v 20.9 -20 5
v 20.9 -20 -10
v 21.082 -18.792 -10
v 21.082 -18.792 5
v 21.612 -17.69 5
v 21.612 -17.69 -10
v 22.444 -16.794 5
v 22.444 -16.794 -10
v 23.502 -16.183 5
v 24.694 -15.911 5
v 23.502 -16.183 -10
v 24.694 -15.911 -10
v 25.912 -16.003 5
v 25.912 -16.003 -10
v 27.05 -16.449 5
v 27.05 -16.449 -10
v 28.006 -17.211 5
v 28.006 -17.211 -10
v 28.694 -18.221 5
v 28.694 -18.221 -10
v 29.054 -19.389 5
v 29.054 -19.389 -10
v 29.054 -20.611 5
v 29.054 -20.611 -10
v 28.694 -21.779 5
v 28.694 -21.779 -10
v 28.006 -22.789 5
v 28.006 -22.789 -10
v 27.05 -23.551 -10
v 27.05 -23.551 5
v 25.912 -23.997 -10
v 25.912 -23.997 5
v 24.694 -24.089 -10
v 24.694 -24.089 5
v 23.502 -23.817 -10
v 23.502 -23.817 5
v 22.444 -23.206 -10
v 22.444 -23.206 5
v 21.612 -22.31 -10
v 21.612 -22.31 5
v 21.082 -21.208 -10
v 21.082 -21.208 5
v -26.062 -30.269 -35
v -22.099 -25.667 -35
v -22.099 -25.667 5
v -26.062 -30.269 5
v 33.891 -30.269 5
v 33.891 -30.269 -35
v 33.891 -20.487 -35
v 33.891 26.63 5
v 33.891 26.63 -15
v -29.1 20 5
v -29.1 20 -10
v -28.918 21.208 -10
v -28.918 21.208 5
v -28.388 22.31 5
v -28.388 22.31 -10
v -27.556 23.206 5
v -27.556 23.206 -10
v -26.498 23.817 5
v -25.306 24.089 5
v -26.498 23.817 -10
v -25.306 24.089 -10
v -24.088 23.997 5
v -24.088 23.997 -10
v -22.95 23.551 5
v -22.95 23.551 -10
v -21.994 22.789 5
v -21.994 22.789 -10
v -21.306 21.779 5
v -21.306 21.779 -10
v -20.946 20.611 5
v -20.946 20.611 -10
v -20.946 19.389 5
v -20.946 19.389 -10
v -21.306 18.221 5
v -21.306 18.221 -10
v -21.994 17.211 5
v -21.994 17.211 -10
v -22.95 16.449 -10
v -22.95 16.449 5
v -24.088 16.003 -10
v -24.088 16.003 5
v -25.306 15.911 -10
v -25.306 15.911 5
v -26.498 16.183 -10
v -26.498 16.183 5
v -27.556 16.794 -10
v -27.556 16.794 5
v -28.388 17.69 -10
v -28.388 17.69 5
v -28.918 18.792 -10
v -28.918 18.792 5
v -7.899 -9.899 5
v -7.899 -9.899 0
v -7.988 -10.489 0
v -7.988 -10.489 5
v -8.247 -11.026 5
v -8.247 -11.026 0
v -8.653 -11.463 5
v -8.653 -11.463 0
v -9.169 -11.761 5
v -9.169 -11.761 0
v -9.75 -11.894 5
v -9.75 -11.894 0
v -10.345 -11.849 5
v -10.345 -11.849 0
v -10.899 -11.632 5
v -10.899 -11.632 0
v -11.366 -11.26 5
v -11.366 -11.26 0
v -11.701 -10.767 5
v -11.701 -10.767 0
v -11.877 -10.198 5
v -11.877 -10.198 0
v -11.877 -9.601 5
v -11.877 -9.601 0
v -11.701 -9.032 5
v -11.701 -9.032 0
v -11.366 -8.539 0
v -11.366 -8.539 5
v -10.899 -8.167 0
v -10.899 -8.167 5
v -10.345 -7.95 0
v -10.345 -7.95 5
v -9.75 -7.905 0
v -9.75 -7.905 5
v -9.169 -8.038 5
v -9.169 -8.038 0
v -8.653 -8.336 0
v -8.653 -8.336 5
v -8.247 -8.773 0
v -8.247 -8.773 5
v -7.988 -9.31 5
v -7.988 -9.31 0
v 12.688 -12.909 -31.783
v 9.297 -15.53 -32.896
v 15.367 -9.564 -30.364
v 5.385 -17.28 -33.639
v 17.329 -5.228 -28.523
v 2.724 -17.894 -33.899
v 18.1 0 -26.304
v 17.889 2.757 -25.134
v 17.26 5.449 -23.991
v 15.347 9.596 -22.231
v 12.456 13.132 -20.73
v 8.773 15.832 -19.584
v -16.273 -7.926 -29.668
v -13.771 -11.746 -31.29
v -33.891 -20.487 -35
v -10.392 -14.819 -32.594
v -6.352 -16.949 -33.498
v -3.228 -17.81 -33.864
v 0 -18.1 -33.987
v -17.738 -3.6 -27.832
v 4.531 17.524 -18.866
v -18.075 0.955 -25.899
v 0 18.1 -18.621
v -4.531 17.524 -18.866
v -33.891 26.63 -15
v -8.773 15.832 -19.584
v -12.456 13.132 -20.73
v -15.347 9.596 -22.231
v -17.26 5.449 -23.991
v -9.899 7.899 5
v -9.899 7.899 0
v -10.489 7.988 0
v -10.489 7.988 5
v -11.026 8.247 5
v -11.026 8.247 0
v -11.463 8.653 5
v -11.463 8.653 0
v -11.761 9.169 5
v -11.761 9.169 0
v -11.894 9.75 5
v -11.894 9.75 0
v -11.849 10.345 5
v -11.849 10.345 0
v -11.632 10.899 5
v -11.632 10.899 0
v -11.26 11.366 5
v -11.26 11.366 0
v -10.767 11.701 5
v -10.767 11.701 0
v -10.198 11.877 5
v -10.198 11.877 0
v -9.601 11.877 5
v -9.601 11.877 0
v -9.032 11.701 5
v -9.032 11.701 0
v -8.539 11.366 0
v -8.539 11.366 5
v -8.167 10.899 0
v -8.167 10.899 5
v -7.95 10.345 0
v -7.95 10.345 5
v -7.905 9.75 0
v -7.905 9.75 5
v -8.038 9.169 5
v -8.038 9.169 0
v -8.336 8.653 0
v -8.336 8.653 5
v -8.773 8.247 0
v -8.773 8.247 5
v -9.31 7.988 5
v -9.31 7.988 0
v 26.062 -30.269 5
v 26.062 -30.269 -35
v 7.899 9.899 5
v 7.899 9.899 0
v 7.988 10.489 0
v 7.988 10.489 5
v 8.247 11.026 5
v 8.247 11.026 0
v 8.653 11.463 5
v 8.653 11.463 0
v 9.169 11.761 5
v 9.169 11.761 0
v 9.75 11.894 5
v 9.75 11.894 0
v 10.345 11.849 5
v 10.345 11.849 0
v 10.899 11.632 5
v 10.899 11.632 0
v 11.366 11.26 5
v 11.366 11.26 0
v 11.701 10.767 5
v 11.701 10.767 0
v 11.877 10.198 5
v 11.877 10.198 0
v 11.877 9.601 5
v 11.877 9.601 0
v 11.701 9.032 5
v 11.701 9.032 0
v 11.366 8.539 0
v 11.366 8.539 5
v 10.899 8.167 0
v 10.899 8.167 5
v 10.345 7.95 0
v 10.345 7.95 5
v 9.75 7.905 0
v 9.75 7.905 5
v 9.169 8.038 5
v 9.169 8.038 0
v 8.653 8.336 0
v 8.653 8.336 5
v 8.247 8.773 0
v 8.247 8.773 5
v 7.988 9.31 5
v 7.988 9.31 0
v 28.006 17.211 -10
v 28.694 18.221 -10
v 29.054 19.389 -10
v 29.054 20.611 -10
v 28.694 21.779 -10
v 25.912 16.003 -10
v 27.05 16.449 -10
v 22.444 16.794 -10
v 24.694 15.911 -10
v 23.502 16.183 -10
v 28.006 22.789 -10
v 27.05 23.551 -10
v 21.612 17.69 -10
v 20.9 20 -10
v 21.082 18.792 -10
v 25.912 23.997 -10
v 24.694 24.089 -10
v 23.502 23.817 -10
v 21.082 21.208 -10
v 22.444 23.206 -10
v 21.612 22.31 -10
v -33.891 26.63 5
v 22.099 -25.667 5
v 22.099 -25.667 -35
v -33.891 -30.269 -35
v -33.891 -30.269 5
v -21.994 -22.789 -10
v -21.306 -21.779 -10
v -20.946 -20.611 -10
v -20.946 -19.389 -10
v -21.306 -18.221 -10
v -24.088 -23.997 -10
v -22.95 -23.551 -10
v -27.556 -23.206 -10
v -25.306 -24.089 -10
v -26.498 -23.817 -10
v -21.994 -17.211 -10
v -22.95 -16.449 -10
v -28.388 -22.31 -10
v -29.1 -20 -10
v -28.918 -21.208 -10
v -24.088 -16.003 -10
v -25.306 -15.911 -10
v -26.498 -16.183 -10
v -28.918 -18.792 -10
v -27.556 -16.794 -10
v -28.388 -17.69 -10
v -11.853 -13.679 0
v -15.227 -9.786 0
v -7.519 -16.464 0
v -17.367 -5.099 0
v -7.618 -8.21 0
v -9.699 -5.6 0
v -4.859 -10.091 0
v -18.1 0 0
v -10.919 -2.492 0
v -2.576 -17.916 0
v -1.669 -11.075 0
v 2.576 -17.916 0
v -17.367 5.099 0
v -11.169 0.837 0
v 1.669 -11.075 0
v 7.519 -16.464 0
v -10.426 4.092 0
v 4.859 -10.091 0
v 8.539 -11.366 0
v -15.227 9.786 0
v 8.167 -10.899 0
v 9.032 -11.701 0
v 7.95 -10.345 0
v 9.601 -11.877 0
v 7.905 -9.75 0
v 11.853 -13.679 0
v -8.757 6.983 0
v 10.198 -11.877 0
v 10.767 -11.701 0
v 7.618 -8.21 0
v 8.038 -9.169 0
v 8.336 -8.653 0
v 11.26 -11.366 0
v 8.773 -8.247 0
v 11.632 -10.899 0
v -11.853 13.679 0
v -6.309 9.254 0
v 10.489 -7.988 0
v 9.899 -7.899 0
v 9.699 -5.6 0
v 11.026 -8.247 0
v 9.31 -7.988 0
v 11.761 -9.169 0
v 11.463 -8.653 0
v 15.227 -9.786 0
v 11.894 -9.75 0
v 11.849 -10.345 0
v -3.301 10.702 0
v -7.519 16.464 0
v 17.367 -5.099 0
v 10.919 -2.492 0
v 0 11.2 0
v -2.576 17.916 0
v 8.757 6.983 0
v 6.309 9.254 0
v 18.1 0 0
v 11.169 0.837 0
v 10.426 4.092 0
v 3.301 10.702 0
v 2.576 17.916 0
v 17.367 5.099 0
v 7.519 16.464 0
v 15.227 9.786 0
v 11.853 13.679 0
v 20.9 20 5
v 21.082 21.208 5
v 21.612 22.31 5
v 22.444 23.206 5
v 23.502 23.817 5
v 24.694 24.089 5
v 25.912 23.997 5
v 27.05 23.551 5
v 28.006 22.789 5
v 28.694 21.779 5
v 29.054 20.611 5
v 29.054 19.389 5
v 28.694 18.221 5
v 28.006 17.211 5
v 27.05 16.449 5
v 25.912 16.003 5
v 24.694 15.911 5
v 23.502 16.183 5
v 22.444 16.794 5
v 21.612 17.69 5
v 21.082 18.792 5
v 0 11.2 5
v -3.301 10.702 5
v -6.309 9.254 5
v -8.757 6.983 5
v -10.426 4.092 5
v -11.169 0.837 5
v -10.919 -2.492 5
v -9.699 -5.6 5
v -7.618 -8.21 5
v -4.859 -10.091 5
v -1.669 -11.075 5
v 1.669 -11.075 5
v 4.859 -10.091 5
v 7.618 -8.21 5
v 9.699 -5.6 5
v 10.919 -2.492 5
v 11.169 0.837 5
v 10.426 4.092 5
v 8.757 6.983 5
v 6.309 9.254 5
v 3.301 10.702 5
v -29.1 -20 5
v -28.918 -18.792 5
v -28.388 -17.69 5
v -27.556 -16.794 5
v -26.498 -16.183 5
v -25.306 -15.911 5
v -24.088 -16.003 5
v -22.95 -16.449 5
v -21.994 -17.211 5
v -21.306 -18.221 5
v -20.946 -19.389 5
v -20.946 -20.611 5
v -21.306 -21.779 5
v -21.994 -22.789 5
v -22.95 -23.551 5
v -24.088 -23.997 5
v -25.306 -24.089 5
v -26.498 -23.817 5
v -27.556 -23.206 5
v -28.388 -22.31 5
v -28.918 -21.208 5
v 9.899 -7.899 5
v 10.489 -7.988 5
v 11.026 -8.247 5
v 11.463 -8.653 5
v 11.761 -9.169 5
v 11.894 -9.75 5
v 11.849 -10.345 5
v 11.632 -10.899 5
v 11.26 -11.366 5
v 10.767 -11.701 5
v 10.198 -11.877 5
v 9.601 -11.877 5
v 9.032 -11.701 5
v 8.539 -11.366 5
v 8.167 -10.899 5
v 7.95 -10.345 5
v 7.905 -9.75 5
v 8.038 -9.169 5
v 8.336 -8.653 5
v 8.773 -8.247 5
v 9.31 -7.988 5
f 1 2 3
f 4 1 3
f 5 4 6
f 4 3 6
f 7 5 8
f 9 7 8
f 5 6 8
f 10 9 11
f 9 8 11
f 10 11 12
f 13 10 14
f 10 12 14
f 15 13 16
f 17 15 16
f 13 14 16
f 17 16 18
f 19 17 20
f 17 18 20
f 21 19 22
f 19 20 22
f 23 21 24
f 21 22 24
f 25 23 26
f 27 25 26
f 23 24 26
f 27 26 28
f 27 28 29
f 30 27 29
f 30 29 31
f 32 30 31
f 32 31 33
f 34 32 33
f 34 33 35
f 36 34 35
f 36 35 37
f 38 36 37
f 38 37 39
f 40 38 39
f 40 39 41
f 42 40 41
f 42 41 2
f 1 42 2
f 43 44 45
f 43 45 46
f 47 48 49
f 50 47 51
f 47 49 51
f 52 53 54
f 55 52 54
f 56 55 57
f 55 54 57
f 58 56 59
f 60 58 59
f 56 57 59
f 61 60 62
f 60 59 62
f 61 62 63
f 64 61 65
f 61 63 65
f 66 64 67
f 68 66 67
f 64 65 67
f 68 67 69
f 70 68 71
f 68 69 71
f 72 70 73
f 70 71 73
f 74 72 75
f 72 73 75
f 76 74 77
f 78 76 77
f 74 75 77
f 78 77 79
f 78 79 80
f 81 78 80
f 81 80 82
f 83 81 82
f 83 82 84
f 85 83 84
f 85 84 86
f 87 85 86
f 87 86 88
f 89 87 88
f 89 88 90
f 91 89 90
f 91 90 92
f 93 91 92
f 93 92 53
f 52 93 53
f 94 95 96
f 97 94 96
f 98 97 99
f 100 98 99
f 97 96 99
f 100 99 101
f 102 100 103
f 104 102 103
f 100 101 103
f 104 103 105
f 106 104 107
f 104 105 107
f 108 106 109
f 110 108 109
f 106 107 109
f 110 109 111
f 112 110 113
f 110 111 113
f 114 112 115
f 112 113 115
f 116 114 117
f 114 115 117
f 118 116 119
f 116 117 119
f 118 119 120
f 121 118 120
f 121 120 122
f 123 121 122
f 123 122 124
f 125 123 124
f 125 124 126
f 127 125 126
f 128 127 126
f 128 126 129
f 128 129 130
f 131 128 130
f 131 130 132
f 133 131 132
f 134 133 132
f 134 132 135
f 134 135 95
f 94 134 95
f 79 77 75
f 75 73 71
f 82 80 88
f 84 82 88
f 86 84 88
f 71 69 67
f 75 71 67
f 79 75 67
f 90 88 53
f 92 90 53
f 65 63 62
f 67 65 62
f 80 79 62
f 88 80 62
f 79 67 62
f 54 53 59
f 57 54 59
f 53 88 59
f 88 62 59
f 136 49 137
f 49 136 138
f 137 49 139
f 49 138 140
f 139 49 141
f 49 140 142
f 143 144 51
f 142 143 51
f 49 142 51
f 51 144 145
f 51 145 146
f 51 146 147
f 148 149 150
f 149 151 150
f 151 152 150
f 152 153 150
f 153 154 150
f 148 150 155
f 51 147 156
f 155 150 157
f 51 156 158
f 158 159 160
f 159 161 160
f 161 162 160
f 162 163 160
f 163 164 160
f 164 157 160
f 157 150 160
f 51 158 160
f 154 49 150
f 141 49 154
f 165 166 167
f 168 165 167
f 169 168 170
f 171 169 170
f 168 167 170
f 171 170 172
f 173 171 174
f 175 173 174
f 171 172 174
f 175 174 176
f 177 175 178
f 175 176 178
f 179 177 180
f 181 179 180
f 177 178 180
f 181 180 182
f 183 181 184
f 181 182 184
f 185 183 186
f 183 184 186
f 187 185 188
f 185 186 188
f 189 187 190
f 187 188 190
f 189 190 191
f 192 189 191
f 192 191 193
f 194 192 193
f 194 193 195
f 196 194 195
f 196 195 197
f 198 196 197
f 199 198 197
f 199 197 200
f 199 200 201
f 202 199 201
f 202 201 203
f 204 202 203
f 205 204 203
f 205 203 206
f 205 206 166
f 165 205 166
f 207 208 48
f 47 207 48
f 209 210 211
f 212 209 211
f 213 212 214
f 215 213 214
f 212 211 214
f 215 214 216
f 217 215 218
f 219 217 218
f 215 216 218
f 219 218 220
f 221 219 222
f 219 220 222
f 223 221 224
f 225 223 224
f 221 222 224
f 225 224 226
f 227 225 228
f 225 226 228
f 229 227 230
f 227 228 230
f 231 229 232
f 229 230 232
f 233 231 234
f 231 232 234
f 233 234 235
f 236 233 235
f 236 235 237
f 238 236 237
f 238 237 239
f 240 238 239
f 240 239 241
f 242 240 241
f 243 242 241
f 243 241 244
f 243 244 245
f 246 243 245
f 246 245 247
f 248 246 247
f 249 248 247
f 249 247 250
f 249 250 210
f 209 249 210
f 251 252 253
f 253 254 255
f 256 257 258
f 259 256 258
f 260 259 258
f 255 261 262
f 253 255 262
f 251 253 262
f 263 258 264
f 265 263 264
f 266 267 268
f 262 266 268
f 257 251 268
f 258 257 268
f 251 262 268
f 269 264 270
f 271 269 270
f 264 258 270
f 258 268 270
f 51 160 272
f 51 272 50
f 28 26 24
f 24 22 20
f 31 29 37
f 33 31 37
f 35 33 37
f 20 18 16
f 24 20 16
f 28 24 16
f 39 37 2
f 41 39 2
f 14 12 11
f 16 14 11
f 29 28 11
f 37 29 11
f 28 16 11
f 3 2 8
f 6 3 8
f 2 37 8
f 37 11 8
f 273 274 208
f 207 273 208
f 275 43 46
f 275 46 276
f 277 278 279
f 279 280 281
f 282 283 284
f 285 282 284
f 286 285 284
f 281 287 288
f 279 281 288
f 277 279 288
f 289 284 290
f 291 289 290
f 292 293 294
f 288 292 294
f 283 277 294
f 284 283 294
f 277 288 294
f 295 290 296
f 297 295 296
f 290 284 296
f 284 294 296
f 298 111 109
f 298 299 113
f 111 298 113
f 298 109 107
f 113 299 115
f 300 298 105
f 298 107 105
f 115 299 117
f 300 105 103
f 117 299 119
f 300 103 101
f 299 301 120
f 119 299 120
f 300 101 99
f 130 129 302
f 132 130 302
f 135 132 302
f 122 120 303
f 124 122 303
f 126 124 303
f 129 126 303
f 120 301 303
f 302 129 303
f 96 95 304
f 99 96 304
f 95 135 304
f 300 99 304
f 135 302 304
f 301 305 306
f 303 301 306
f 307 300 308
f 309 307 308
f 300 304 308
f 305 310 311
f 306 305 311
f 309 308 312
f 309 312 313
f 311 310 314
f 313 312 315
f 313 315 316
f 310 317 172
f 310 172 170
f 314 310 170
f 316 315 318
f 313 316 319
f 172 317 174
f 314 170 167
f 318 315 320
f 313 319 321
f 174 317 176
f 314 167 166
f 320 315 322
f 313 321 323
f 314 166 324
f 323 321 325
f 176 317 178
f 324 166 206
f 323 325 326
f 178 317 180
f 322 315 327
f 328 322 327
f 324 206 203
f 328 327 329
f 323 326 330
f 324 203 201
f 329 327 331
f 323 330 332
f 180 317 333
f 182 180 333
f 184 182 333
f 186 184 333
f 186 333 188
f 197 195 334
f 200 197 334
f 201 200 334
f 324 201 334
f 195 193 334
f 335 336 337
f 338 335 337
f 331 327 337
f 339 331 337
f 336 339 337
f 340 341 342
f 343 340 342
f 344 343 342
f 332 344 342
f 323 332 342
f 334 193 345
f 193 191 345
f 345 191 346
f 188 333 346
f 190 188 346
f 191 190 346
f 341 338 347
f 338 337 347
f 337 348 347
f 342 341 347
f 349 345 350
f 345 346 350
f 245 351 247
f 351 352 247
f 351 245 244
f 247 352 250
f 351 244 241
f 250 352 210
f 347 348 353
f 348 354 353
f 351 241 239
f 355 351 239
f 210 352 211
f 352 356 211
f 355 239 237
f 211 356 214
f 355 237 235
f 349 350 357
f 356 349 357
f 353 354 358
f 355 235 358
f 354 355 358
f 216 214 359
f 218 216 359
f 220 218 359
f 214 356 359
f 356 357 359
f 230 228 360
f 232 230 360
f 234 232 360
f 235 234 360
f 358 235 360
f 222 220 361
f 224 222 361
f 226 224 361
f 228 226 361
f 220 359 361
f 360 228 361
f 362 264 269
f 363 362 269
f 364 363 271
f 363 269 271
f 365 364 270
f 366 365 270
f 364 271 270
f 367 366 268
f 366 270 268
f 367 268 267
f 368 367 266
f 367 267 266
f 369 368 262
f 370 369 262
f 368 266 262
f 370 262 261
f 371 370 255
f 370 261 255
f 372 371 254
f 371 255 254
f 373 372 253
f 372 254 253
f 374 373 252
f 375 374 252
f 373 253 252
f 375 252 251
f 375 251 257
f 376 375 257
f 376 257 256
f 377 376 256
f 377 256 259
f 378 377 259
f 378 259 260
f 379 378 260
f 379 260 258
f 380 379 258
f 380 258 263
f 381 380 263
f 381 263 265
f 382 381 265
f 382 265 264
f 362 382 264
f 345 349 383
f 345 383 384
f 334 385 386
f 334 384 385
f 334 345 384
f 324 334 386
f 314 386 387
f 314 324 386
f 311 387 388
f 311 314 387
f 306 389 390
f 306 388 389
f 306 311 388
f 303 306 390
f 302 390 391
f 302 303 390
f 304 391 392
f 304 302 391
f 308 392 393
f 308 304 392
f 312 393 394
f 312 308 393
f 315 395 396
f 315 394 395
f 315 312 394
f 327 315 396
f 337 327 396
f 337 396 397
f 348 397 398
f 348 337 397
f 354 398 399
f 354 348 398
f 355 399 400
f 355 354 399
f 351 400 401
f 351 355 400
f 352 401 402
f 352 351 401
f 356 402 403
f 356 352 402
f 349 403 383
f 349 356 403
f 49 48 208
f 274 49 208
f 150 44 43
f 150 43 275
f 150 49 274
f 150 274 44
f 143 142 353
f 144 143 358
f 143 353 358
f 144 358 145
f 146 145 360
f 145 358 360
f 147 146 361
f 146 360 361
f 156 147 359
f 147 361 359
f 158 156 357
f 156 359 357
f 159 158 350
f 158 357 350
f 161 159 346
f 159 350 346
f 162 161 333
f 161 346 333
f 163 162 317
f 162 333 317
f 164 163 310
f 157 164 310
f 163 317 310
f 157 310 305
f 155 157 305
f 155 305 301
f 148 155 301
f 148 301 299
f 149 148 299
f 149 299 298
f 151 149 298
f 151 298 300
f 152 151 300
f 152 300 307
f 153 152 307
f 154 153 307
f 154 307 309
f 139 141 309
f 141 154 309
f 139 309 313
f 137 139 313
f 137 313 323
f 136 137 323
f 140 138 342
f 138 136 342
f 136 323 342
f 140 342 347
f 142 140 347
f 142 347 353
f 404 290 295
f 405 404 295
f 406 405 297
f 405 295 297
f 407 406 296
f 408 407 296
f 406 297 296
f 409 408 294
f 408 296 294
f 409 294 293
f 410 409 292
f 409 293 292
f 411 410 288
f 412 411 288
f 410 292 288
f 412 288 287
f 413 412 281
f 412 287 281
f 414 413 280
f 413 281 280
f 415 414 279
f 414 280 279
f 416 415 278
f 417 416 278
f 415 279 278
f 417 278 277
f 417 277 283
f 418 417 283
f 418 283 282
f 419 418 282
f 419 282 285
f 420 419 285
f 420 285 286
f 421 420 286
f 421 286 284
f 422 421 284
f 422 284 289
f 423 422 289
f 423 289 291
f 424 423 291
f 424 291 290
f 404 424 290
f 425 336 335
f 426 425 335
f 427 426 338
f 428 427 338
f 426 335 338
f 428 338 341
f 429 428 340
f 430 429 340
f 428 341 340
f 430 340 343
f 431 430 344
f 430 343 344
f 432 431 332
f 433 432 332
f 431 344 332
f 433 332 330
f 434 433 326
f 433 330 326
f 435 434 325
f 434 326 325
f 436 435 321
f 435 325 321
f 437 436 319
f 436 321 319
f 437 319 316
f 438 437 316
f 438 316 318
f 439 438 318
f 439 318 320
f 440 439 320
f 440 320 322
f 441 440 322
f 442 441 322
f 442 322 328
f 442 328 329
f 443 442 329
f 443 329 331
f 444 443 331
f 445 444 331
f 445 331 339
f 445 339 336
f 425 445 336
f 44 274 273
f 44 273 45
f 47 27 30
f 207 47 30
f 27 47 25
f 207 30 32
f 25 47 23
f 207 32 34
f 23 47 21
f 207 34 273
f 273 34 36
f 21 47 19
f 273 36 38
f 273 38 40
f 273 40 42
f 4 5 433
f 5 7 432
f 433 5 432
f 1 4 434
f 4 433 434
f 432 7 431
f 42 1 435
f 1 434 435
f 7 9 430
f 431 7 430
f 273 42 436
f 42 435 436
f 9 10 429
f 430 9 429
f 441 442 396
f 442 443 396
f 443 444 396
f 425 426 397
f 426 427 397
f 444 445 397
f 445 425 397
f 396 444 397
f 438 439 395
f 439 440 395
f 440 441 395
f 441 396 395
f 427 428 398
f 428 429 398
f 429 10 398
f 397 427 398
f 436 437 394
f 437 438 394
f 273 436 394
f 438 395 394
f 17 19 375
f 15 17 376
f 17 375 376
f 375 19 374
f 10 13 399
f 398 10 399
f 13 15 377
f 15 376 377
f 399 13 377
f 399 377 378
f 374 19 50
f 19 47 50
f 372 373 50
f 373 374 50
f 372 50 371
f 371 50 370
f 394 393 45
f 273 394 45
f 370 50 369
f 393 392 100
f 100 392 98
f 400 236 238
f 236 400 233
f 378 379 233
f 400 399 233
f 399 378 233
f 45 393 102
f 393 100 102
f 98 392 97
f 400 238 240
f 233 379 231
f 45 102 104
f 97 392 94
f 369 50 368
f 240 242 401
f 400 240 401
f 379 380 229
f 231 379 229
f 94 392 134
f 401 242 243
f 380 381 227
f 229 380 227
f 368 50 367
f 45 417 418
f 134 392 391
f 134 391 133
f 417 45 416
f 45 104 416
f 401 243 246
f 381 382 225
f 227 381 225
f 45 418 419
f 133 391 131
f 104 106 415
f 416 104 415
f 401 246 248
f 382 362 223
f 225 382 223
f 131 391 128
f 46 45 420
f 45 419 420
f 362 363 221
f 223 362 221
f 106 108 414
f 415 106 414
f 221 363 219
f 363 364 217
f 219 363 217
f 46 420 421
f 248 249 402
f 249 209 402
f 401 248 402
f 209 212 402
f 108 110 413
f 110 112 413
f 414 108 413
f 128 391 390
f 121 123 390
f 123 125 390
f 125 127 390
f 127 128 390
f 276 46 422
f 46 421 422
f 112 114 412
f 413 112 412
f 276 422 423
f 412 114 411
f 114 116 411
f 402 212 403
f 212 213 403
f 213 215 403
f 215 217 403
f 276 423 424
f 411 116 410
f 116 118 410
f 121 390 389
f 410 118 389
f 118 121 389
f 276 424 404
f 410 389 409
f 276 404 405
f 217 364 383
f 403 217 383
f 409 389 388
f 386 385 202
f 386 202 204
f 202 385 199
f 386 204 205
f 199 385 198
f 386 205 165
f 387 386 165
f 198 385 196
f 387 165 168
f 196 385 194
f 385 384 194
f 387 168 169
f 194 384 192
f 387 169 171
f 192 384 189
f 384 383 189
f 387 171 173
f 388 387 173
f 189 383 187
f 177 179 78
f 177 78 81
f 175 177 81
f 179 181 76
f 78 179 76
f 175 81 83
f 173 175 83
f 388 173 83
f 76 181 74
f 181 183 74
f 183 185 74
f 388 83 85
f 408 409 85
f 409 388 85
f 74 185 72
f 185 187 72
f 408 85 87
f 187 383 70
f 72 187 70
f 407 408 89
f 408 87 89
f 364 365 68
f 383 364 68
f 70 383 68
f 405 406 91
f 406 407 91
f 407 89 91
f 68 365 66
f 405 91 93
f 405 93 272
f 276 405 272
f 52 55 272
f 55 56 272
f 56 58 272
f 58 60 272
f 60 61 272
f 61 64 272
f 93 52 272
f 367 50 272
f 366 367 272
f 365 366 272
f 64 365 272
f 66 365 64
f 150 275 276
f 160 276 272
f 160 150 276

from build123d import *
from build123d.topology import SkipClean

# Parameters (mm, degrees)
SALIENTE_EXTRUIR1_START = -35
SALIENTE_EXTRUIR1_DEPTH = 40
CROQUIS5_R              = 18.1
CORTAR_EXTRUIR1_DEPTH   = 35
CHAFL_N1_SIZE           = 47.117047316
CHAFL_N1_SIZE_2         = 20
TALADRO1_D              = 8.2
TALADRO1_DEPTH          = 15
TALADRO3_D              = 4
MATRIZC2_COUNT          = 4


with BuildPart() as part:
    # Croquis2 → Saliente-Extruir1 (new body)
    with BuildSketch(Plane.XY.offset(SALIENTE_EXTRUIR1_START)):
        with BuildLine():
            Line((0, -11.2), (0, -25.666803753))
            Line((0, -25.666803753), (22.099478046, -25.666803753))
            Line((22.099478046, -25.666803753), (26.062319902, -30.269332556))
            Line((26.062319902, -30.269332556), (33.890912562, -30.269332556))
            Line((33.890912562, -30.269332556), (33.890912562, 26.630335828))
            Line((33.890912562, 26.630335828), (0, 26.630335828))
            Line((0, 26.630335828), (0, 11.2))
            ThreePointArc((0, 11.2), (11.2, 0), (0, -11.2))
        make_face()
    saliente_extruir1 = extrude(amount=SALIENTE_EXTRUIR1_DEPTH)

    # Simetría1: Saliente-Extruir1 across plane
    with SkipClean():  # the faces are left unmerged after this step: merging them gives an invalid solid
        add(saliente_extruir1.mirror(Plane(origin=(0, 0, 0), x_dir=(0, 0, 1), z_dir=(1, 0, 0))))

    # Croquis5 → Cortar-Extruir1 (cut)
    with SkipClean():  # the faces are left unmerged after this step: merging them gives an invalid solid
        with BuildSketch(Plane.XY):
            Circle(CROQUIS5_R)
        extrude(amount=-CORTAR_EXTRUIR1_DEPTH, mode=Mode.SUBTRACT)

    # Chaflán1
    # the kernel refuses this chamfer: 47.117047316, 20 mm, written as the material it takes off along each edge
    with BuildSketch(Plane(origin=(156.034553022, 26.630335828, -35), x_dir=(0, -0.9998864034585262, -0.015072497429863657), z_dir=(-1, 0, 0))) as chafl_n1_piece_1:
        Polygon((CHAFL_N1_SIZE * 0.999886403469, CHAFL_N1_SIZE * 0.01507249743), (-CHAFL_N1_SIZE_2 * 0.0150724974299, CHAFL_N1_SIZE_2 * 0.999886403459), (0, 0), align=None)
    extrude(amount=156.034553022, mode=Mode.SUBTRACT)
    with BuildSketch(Plane(origin=(-156.034553022, 26.630335828, -35), x_dir=(0, -0.9998864034585262, -0.015072497429863657), z_dir=(1, 0, 0))) as chafl_n1_piece_2:
        Polygon((CHAFL_N1_SIZE * 0.999886403469, -CHAFL_N1_SIZE * 0.01507249743), (-CHAFL_N1_SIZE_2 * 0.0150724974299, -CHAFL_N1_SIZE_2 * 0.999886403459), (0, 0), align=None)
    extrude(amount=156.034553022, mode=Mode.SUBTRACT)

    # Taladro1
    with Locations(Plane.XY.offset(5)):
        with Locations((25, -20), (25, 20), (-25, 20), (-25, -20)):
            Hole(TALADRO1_D / 2, depth=TALADRO1_DEPTH)

    # Taladro3 (through all)
    with Locations(Plane.XY.offset(5)):
        with Locations((9.899494937, 9.899494937)):
            taladro3 = Hole(TALADRO3_D / 2)

    # MatrizC2: Taladro3 ×4 about axis
    matrizc2_axis = Axis((0, 0, 0), (0, 0, 1))
    for i in range(1, MATRIZC2_COUNT):
        add(taladro3.rotate(matrizc2_axis, i * 360 / MATRIZC2_COUNT), mode=Mode.SUBTRACT)


solid = part.part
